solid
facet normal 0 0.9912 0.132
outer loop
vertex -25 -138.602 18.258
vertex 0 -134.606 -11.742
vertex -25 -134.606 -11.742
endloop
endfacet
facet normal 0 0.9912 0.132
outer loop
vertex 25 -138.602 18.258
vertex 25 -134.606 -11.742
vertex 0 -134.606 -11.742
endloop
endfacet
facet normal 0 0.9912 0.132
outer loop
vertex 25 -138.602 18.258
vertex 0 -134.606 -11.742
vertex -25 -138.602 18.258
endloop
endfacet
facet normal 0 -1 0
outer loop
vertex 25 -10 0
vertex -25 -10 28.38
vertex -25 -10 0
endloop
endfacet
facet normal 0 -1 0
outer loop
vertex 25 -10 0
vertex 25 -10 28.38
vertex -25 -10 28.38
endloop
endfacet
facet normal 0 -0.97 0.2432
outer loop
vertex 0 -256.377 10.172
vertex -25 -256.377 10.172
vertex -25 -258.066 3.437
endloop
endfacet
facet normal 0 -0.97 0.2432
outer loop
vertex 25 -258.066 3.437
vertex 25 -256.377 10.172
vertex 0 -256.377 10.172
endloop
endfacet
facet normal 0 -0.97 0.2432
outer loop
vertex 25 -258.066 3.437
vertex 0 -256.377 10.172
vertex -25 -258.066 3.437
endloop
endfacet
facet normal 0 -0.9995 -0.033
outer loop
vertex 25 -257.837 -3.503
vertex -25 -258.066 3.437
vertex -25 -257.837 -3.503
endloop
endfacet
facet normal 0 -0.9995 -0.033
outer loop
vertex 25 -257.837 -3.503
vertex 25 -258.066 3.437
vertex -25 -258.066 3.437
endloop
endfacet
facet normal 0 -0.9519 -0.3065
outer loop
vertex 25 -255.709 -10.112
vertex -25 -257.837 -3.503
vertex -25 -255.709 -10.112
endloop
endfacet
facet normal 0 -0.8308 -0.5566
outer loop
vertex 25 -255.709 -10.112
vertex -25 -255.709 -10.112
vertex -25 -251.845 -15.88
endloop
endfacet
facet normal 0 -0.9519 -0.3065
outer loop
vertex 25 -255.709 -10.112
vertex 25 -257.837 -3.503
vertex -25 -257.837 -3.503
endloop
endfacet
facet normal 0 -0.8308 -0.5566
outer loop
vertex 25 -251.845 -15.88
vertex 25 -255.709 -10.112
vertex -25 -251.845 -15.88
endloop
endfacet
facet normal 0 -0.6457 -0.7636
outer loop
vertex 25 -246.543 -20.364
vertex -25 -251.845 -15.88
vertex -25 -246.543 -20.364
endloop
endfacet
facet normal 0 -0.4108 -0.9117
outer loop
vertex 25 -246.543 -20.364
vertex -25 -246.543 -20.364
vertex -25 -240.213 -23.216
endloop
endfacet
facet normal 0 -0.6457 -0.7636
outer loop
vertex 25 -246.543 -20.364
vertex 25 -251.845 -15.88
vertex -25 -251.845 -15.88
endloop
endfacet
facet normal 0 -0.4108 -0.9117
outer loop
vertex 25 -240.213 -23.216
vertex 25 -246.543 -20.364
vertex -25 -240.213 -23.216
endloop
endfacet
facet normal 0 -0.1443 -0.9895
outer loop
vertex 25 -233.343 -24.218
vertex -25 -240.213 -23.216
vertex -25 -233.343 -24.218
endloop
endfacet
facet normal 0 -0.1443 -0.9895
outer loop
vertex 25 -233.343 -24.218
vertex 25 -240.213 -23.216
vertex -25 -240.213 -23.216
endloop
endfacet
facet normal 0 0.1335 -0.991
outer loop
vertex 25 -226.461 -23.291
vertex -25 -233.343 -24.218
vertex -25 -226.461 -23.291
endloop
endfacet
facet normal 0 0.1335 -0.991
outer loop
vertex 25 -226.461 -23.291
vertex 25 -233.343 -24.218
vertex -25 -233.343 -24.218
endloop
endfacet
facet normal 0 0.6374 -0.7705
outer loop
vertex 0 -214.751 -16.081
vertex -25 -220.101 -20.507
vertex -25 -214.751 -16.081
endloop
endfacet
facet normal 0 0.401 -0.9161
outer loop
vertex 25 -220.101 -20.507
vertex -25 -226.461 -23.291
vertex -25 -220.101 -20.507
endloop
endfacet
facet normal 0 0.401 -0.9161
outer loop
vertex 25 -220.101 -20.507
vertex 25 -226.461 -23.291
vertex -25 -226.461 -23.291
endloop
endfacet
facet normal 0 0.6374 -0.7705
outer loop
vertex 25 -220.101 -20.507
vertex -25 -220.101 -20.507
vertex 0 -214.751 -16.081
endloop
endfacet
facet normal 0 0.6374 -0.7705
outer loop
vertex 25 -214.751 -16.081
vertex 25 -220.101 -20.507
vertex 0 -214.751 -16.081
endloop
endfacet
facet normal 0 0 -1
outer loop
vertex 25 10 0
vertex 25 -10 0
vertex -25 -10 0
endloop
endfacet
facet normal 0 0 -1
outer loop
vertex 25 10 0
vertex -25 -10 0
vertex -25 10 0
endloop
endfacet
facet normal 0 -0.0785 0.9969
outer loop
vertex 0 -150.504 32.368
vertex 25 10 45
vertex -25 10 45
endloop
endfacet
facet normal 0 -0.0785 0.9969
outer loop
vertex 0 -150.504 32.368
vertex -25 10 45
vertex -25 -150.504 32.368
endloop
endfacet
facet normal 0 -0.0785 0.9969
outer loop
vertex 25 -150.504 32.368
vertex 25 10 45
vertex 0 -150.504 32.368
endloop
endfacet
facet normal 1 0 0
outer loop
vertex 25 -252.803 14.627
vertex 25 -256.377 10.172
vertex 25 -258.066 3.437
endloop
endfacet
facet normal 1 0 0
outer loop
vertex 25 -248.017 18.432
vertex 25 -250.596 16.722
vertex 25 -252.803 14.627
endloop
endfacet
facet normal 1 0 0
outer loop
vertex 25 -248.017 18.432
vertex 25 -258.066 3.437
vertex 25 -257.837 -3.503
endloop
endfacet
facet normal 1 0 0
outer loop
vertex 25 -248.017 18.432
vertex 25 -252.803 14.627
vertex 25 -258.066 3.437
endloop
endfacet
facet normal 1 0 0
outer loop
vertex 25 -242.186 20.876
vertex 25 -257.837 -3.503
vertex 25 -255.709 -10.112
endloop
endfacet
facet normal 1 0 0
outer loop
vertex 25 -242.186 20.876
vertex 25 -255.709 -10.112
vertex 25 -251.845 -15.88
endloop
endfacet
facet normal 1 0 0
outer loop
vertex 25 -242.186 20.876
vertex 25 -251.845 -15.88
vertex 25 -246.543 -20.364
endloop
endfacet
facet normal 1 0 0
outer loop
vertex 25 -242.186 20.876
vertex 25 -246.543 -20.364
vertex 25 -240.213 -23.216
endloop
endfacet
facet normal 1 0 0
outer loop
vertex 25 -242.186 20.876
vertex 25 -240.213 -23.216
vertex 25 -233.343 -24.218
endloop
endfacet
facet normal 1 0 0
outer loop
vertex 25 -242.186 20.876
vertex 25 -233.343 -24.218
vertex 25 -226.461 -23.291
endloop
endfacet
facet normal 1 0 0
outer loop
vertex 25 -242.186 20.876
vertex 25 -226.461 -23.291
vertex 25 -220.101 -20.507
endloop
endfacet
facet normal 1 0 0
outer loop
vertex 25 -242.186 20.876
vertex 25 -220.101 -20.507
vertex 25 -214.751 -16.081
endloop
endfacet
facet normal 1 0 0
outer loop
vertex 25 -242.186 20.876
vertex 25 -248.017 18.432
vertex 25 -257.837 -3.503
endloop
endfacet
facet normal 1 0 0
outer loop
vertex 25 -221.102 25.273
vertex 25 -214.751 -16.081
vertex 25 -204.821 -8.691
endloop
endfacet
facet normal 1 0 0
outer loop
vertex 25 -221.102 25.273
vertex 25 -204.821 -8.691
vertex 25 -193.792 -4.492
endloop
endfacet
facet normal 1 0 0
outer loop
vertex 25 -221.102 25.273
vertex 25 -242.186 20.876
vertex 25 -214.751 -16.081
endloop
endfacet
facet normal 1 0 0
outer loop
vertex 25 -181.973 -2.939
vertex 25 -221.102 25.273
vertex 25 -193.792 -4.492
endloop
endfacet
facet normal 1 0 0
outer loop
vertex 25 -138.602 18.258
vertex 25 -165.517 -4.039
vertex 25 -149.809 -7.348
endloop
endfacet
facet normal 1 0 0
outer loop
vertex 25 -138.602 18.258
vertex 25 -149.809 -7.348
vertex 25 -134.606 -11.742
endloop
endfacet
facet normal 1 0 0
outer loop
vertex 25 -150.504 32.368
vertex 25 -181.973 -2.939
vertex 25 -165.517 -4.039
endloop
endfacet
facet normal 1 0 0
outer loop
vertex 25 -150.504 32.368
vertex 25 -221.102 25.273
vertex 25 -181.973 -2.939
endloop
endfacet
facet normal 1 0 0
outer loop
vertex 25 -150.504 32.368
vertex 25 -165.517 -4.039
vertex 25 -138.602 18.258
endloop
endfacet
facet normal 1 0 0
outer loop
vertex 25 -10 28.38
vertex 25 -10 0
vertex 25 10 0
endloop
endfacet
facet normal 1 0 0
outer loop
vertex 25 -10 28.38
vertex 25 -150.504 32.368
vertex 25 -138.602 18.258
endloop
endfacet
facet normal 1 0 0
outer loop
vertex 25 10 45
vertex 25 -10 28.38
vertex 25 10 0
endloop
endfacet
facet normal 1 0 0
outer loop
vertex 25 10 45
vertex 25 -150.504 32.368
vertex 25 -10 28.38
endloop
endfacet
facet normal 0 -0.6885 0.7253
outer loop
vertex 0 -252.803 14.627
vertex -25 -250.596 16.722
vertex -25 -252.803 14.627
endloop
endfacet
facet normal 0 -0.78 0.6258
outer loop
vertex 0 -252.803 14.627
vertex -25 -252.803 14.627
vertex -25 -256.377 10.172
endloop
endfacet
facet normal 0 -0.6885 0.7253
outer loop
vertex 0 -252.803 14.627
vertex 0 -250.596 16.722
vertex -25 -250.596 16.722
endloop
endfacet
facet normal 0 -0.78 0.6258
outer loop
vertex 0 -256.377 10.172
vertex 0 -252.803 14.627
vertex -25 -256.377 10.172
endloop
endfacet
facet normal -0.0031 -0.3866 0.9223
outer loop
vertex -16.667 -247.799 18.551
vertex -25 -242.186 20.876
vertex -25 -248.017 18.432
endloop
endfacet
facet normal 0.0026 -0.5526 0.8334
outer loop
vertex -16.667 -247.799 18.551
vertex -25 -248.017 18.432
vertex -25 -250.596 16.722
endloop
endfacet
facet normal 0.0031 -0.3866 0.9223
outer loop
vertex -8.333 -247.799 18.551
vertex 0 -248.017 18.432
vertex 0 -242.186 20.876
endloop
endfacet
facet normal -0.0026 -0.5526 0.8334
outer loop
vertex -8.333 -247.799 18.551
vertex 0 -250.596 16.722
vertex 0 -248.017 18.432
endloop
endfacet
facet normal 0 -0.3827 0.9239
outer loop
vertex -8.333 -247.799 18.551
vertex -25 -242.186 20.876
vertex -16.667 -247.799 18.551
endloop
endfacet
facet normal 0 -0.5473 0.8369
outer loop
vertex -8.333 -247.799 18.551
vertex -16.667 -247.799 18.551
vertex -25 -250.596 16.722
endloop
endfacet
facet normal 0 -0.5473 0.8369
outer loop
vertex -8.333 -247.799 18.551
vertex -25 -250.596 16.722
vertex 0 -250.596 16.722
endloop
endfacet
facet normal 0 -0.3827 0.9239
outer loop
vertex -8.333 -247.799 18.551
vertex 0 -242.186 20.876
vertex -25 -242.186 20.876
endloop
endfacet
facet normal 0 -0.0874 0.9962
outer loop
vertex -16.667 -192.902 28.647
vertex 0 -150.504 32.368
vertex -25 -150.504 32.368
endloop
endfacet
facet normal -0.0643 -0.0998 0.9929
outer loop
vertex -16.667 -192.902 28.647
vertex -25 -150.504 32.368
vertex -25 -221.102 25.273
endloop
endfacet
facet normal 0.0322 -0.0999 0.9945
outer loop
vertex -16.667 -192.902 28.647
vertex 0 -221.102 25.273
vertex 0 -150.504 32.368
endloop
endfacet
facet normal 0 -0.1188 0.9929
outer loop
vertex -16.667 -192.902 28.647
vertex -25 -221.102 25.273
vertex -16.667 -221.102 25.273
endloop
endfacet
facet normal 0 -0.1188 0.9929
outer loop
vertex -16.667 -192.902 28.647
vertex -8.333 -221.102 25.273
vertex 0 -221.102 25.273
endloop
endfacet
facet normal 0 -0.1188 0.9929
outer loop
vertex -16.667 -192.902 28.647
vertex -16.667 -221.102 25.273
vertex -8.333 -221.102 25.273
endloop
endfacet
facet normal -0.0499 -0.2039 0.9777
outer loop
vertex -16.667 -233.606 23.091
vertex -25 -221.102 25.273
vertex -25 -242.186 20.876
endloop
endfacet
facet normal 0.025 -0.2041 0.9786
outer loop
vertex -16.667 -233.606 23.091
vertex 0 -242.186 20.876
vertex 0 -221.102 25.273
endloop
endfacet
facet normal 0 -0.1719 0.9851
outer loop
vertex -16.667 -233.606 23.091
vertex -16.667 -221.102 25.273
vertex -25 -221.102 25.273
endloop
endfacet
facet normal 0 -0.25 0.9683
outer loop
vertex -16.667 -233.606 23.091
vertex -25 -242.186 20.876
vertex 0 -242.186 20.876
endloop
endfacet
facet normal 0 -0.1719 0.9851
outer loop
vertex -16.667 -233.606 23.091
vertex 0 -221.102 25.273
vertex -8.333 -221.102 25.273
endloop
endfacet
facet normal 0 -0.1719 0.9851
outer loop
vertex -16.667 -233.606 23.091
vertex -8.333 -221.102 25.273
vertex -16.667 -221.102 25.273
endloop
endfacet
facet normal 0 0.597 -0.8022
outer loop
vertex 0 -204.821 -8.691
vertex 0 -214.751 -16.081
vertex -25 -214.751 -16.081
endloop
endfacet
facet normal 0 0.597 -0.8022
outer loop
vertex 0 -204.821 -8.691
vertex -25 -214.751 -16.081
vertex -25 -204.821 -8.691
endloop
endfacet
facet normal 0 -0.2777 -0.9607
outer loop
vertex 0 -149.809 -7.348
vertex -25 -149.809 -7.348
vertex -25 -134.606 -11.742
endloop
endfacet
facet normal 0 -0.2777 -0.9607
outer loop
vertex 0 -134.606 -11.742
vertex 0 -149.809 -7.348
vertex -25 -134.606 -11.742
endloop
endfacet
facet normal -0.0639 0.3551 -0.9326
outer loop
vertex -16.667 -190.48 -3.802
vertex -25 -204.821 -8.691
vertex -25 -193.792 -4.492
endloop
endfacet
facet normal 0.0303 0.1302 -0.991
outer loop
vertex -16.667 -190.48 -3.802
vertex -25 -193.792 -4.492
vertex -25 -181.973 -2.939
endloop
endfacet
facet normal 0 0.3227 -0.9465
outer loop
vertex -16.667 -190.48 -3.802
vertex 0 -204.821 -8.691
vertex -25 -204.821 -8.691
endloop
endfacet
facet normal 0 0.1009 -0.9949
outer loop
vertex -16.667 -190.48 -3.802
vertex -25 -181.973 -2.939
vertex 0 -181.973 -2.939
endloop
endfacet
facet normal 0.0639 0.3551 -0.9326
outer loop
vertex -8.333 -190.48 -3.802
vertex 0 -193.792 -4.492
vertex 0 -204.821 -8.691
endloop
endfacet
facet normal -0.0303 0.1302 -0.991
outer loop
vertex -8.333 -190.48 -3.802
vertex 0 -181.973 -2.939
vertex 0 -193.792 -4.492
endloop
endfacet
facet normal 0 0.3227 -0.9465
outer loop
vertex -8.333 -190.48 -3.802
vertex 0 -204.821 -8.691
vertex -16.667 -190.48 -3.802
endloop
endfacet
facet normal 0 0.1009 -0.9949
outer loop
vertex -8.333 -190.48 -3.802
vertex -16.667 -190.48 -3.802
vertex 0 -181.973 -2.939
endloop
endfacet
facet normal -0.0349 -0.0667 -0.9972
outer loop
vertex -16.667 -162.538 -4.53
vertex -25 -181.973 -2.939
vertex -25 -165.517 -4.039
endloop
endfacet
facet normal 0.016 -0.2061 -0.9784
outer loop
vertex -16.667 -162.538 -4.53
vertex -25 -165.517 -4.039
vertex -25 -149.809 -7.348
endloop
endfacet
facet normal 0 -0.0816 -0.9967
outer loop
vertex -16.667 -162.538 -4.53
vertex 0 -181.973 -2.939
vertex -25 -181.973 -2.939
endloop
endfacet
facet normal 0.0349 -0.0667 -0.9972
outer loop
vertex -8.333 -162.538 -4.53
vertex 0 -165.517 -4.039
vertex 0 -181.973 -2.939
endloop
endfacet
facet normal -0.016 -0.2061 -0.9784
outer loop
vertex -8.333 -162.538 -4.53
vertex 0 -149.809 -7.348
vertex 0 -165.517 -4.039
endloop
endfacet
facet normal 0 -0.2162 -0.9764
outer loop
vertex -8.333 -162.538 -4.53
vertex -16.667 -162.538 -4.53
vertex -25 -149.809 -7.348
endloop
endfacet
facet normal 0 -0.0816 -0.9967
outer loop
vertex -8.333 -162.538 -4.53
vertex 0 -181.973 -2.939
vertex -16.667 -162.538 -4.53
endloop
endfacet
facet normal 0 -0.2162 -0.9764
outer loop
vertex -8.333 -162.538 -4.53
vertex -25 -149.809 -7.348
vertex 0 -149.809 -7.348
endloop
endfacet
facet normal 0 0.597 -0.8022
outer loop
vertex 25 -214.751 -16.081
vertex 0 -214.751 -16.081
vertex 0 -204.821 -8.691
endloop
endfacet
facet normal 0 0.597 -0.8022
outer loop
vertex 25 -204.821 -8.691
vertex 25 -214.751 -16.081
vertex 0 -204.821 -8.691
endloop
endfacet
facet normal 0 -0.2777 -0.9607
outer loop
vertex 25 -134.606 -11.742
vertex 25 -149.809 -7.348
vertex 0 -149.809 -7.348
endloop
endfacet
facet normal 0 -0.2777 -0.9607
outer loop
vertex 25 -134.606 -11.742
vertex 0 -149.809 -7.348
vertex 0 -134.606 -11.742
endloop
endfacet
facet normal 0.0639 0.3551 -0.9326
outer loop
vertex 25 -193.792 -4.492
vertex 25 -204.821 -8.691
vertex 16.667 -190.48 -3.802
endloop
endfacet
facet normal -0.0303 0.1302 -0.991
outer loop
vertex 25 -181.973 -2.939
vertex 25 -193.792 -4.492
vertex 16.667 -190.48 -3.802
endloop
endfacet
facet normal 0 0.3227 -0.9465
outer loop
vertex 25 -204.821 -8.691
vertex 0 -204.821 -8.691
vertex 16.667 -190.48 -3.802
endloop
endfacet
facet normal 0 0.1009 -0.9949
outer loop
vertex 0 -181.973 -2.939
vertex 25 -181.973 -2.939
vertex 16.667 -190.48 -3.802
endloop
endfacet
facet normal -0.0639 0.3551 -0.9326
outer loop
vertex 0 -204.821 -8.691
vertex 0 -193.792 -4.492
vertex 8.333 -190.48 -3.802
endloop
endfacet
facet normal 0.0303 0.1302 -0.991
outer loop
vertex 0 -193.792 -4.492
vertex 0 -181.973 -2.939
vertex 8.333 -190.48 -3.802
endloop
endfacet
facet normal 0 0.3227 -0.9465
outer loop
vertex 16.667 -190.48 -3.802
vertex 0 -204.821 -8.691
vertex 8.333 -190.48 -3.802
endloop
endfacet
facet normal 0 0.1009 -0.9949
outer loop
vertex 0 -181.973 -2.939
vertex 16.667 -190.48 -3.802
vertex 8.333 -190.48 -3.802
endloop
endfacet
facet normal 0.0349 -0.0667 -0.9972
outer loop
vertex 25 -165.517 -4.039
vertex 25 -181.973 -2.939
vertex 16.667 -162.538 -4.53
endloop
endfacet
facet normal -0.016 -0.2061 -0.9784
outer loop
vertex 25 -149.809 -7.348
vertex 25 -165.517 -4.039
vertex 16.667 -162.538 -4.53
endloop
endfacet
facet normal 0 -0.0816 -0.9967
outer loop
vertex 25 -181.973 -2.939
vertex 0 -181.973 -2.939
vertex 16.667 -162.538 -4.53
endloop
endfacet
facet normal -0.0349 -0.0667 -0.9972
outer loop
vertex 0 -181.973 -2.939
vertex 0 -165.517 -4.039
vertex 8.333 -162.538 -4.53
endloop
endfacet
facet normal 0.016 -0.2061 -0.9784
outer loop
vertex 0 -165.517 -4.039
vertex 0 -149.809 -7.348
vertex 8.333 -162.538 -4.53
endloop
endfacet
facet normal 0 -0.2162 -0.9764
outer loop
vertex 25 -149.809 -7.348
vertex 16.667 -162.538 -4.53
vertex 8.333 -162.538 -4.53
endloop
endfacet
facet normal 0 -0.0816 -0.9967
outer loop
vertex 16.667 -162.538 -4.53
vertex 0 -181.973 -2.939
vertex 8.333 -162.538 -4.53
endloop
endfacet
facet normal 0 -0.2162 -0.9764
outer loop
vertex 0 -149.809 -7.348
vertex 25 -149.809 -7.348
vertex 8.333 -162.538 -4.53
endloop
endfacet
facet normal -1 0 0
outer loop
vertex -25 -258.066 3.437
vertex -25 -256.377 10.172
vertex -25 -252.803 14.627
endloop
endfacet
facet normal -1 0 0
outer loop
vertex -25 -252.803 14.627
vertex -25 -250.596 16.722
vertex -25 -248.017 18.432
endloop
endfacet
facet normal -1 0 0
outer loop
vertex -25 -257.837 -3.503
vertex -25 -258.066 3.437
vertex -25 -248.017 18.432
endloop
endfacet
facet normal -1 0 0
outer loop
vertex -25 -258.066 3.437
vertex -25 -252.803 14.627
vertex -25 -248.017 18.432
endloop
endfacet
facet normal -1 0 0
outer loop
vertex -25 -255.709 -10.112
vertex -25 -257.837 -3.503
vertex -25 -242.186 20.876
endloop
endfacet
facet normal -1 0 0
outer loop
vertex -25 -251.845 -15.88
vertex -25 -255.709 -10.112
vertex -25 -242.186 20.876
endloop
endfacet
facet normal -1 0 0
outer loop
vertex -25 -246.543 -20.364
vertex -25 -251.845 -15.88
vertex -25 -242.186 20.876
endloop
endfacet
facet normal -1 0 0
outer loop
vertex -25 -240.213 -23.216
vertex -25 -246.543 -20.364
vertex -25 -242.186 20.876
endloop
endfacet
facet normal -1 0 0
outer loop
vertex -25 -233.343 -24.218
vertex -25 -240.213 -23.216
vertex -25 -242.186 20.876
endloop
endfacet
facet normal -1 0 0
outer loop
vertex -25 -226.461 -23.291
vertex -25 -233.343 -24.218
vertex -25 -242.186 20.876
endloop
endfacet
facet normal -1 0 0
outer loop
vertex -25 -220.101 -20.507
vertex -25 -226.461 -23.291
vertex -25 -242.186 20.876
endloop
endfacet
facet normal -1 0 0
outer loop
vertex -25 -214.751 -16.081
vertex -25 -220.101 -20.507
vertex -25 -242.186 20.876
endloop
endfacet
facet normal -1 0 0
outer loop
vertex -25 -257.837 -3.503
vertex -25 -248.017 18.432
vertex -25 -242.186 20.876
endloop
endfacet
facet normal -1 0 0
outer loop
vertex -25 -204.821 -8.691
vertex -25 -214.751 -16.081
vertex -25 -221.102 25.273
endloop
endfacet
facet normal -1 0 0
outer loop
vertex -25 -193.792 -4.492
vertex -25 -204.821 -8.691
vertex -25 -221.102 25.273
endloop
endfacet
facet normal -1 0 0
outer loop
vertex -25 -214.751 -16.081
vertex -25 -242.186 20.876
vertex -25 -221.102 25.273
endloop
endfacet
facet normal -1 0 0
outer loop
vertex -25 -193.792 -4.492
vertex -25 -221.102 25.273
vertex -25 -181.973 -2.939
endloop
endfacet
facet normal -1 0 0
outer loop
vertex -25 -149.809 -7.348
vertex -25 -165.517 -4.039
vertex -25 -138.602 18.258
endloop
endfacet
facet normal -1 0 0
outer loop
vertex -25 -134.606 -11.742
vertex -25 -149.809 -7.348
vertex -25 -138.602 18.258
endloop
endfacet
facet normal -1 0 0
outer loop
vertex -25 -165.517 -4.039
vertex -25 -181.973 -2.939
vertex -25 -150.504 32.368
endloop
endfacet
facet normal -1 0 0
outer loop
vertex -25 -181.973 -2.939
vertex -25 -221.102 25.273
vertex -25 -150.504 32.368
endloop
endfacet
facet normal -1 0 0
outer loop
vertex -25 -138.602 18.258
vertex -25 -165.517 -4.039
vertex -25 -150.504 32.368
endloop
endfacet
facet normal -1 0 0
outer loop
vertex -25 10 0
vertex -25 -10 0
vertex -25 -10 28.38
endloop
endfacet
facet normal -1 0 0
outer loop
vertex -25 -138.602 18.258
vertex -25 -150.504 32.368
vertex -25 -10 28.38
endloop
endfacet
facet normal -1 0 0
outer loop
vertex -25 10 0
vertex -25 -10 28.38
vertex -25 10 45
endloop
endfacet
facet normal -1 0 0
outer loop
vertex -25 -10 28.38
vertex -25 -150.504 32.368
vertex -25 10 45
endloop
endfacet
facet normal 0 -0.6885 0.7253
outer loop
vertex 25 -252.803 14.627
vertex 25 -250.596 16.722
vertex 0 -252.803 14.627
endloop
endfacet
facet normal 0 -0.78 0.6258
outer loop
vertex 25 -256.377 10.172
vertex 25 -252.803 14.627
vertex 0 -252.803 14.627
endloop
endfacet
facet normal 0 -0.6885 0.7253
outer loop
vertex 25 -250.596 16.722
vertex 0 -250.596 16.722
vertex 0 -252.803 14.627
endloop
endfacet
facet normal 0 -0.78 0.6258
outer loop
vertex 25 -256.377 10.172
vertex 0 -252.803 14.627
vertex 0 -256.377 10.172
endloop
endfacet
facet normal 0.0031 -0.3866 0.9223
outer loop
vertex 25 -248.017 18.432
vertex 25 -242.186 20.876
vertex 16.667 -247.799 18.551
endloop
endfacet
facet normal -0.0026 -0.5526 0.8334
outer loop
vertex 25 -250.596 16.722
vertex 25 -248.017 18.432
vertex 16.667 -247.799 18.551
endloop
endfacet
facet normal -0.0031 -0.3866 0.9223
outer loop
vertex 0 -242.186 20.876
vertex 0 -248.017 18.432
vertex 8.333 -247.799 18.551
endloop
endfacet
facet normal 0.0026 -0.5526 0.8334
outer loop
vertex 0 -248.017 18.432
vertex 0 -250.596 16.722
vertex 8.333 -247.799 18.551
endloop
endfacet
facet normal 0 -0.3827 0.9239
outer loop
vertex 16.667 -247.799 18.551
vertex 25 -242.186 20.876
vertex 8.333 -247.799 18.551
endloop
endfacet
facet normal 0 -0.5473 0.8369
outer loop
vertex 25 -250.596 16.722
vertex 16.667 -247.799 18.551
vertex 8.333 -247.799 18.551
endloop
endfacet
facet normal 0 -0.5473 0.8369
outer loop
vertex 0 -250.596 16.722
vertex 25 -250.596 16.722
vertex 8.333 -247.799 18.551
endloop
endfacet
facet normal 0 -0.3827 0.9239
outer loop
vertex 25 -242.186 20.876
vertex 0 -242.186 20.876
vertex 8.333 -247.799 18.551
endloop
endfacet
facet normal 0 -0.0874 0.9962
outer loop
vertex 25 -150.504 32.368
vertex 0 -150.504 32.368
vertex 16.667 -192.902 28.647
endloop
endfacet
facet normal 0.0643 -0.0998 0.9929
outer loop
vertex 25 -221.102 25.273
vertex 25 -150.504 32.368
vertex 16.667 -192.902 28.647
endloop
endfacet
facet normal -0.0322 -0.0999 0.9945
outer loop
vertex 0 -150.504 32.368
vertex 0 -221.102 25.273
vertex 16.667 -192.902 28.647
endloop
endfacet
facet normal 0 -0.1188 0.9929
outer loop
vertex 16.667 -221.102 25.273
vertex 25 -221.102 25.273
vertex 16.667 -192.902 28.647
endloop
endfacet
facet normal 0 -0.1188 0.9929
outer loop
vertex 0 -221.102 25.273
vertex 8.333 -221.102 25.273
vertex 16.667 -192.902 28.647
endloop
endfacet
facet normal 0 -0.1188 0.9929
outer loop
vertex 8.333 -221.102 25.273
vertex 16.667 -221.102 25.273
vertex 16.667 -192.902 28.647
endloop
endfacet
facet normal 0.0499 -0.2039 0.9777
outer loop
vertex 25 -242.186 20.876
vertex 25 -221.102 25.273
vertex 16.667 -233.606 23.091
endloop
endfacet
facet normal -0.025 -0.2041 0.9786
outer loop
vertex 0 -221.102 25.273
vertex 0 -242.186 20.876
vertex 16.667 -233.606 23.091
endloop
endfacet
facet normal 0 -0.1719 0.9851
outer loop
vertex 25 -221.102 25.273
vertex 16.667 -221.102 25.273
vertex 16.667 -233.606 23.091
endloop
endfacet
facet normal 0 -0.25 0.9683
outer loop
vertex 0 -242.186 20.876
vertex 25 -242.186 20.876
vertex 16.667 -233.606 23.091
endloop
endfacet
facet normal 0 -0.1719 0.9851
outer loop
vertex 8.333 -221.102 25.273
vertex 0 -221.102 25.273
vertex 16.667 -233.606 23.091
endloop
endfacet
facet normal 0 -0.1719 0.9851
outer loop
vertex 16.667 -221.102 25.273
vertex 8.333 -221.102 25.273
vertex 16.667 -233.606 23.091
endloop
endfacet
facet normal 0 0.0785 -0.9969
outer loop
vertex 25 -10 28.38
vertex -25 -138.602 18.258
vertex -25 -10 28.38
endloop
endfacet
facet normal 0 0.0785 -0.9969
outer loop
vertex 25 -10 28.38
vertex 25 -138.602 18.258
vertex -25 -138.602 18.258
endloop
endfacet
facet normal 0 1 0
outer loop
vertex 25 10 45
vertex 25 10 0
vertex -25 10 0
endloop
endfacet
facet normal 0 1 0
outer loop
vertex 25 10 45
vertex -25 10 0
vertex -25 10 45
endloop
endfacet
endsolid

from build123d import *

# Parameters (mm, degrees)
F1_DEPTH = 25


# Not quite as in the source:
# - a feature of the source that left no trace in its solid (it failed there, or was rolled back) is left out


with BuildPart() as f1:
    # F0 (on Right) → F1 (new body, symmetric)
    with BuildSketch(Plane.YZ):
        with BuildLine():
            Line((-10, 28.3795828863), (-10, 0))
            Line((-10, 0), (10, 0))
            Line((10, 0), (10, 45))
            Line((10, 45), (-150.503690731, 32.3680855878))
            add(Edge.make_bspline(
                [(-150.503690731, 32.3680855878), (-251.6470152481, 24.4079333144), (-248.2635080814, 20.058169961), (-256.3765901785, 10.171615941)],
                knots=[0, 0, 0, 0, 108.1746463003, 108.1746463003, 108.1746463003, 108.1746463003], degree=3))
            ThreePointArc((-256.3765901785, 10.171615941), (-246.5433476591, -20.3637900829), (-214.7508155307, -16.0814332135))
            add(Edge.make_bspline(
                [(-214.7508155307, -16.0814332135), (-193.5426698765, 4.8777479678), (-161.3064821603, -3.4644254483), (-134.6062239053, -11.7416404626)],
                knots=[0, 0, 0, 0, 80.2620045097, 80.2620045097, 80.2620045097, 80.2620045097], degree=3))
            Line((-134.6062239053, -11.7416404626), (-138.6023360516, 18.2583595374))
            Line((-138.6023360516, 18.2583595374), (-10, 28.3795828863))
        make_face()
    extrude(amount=F1_DEPTH, both=True)


solid = f1.part
